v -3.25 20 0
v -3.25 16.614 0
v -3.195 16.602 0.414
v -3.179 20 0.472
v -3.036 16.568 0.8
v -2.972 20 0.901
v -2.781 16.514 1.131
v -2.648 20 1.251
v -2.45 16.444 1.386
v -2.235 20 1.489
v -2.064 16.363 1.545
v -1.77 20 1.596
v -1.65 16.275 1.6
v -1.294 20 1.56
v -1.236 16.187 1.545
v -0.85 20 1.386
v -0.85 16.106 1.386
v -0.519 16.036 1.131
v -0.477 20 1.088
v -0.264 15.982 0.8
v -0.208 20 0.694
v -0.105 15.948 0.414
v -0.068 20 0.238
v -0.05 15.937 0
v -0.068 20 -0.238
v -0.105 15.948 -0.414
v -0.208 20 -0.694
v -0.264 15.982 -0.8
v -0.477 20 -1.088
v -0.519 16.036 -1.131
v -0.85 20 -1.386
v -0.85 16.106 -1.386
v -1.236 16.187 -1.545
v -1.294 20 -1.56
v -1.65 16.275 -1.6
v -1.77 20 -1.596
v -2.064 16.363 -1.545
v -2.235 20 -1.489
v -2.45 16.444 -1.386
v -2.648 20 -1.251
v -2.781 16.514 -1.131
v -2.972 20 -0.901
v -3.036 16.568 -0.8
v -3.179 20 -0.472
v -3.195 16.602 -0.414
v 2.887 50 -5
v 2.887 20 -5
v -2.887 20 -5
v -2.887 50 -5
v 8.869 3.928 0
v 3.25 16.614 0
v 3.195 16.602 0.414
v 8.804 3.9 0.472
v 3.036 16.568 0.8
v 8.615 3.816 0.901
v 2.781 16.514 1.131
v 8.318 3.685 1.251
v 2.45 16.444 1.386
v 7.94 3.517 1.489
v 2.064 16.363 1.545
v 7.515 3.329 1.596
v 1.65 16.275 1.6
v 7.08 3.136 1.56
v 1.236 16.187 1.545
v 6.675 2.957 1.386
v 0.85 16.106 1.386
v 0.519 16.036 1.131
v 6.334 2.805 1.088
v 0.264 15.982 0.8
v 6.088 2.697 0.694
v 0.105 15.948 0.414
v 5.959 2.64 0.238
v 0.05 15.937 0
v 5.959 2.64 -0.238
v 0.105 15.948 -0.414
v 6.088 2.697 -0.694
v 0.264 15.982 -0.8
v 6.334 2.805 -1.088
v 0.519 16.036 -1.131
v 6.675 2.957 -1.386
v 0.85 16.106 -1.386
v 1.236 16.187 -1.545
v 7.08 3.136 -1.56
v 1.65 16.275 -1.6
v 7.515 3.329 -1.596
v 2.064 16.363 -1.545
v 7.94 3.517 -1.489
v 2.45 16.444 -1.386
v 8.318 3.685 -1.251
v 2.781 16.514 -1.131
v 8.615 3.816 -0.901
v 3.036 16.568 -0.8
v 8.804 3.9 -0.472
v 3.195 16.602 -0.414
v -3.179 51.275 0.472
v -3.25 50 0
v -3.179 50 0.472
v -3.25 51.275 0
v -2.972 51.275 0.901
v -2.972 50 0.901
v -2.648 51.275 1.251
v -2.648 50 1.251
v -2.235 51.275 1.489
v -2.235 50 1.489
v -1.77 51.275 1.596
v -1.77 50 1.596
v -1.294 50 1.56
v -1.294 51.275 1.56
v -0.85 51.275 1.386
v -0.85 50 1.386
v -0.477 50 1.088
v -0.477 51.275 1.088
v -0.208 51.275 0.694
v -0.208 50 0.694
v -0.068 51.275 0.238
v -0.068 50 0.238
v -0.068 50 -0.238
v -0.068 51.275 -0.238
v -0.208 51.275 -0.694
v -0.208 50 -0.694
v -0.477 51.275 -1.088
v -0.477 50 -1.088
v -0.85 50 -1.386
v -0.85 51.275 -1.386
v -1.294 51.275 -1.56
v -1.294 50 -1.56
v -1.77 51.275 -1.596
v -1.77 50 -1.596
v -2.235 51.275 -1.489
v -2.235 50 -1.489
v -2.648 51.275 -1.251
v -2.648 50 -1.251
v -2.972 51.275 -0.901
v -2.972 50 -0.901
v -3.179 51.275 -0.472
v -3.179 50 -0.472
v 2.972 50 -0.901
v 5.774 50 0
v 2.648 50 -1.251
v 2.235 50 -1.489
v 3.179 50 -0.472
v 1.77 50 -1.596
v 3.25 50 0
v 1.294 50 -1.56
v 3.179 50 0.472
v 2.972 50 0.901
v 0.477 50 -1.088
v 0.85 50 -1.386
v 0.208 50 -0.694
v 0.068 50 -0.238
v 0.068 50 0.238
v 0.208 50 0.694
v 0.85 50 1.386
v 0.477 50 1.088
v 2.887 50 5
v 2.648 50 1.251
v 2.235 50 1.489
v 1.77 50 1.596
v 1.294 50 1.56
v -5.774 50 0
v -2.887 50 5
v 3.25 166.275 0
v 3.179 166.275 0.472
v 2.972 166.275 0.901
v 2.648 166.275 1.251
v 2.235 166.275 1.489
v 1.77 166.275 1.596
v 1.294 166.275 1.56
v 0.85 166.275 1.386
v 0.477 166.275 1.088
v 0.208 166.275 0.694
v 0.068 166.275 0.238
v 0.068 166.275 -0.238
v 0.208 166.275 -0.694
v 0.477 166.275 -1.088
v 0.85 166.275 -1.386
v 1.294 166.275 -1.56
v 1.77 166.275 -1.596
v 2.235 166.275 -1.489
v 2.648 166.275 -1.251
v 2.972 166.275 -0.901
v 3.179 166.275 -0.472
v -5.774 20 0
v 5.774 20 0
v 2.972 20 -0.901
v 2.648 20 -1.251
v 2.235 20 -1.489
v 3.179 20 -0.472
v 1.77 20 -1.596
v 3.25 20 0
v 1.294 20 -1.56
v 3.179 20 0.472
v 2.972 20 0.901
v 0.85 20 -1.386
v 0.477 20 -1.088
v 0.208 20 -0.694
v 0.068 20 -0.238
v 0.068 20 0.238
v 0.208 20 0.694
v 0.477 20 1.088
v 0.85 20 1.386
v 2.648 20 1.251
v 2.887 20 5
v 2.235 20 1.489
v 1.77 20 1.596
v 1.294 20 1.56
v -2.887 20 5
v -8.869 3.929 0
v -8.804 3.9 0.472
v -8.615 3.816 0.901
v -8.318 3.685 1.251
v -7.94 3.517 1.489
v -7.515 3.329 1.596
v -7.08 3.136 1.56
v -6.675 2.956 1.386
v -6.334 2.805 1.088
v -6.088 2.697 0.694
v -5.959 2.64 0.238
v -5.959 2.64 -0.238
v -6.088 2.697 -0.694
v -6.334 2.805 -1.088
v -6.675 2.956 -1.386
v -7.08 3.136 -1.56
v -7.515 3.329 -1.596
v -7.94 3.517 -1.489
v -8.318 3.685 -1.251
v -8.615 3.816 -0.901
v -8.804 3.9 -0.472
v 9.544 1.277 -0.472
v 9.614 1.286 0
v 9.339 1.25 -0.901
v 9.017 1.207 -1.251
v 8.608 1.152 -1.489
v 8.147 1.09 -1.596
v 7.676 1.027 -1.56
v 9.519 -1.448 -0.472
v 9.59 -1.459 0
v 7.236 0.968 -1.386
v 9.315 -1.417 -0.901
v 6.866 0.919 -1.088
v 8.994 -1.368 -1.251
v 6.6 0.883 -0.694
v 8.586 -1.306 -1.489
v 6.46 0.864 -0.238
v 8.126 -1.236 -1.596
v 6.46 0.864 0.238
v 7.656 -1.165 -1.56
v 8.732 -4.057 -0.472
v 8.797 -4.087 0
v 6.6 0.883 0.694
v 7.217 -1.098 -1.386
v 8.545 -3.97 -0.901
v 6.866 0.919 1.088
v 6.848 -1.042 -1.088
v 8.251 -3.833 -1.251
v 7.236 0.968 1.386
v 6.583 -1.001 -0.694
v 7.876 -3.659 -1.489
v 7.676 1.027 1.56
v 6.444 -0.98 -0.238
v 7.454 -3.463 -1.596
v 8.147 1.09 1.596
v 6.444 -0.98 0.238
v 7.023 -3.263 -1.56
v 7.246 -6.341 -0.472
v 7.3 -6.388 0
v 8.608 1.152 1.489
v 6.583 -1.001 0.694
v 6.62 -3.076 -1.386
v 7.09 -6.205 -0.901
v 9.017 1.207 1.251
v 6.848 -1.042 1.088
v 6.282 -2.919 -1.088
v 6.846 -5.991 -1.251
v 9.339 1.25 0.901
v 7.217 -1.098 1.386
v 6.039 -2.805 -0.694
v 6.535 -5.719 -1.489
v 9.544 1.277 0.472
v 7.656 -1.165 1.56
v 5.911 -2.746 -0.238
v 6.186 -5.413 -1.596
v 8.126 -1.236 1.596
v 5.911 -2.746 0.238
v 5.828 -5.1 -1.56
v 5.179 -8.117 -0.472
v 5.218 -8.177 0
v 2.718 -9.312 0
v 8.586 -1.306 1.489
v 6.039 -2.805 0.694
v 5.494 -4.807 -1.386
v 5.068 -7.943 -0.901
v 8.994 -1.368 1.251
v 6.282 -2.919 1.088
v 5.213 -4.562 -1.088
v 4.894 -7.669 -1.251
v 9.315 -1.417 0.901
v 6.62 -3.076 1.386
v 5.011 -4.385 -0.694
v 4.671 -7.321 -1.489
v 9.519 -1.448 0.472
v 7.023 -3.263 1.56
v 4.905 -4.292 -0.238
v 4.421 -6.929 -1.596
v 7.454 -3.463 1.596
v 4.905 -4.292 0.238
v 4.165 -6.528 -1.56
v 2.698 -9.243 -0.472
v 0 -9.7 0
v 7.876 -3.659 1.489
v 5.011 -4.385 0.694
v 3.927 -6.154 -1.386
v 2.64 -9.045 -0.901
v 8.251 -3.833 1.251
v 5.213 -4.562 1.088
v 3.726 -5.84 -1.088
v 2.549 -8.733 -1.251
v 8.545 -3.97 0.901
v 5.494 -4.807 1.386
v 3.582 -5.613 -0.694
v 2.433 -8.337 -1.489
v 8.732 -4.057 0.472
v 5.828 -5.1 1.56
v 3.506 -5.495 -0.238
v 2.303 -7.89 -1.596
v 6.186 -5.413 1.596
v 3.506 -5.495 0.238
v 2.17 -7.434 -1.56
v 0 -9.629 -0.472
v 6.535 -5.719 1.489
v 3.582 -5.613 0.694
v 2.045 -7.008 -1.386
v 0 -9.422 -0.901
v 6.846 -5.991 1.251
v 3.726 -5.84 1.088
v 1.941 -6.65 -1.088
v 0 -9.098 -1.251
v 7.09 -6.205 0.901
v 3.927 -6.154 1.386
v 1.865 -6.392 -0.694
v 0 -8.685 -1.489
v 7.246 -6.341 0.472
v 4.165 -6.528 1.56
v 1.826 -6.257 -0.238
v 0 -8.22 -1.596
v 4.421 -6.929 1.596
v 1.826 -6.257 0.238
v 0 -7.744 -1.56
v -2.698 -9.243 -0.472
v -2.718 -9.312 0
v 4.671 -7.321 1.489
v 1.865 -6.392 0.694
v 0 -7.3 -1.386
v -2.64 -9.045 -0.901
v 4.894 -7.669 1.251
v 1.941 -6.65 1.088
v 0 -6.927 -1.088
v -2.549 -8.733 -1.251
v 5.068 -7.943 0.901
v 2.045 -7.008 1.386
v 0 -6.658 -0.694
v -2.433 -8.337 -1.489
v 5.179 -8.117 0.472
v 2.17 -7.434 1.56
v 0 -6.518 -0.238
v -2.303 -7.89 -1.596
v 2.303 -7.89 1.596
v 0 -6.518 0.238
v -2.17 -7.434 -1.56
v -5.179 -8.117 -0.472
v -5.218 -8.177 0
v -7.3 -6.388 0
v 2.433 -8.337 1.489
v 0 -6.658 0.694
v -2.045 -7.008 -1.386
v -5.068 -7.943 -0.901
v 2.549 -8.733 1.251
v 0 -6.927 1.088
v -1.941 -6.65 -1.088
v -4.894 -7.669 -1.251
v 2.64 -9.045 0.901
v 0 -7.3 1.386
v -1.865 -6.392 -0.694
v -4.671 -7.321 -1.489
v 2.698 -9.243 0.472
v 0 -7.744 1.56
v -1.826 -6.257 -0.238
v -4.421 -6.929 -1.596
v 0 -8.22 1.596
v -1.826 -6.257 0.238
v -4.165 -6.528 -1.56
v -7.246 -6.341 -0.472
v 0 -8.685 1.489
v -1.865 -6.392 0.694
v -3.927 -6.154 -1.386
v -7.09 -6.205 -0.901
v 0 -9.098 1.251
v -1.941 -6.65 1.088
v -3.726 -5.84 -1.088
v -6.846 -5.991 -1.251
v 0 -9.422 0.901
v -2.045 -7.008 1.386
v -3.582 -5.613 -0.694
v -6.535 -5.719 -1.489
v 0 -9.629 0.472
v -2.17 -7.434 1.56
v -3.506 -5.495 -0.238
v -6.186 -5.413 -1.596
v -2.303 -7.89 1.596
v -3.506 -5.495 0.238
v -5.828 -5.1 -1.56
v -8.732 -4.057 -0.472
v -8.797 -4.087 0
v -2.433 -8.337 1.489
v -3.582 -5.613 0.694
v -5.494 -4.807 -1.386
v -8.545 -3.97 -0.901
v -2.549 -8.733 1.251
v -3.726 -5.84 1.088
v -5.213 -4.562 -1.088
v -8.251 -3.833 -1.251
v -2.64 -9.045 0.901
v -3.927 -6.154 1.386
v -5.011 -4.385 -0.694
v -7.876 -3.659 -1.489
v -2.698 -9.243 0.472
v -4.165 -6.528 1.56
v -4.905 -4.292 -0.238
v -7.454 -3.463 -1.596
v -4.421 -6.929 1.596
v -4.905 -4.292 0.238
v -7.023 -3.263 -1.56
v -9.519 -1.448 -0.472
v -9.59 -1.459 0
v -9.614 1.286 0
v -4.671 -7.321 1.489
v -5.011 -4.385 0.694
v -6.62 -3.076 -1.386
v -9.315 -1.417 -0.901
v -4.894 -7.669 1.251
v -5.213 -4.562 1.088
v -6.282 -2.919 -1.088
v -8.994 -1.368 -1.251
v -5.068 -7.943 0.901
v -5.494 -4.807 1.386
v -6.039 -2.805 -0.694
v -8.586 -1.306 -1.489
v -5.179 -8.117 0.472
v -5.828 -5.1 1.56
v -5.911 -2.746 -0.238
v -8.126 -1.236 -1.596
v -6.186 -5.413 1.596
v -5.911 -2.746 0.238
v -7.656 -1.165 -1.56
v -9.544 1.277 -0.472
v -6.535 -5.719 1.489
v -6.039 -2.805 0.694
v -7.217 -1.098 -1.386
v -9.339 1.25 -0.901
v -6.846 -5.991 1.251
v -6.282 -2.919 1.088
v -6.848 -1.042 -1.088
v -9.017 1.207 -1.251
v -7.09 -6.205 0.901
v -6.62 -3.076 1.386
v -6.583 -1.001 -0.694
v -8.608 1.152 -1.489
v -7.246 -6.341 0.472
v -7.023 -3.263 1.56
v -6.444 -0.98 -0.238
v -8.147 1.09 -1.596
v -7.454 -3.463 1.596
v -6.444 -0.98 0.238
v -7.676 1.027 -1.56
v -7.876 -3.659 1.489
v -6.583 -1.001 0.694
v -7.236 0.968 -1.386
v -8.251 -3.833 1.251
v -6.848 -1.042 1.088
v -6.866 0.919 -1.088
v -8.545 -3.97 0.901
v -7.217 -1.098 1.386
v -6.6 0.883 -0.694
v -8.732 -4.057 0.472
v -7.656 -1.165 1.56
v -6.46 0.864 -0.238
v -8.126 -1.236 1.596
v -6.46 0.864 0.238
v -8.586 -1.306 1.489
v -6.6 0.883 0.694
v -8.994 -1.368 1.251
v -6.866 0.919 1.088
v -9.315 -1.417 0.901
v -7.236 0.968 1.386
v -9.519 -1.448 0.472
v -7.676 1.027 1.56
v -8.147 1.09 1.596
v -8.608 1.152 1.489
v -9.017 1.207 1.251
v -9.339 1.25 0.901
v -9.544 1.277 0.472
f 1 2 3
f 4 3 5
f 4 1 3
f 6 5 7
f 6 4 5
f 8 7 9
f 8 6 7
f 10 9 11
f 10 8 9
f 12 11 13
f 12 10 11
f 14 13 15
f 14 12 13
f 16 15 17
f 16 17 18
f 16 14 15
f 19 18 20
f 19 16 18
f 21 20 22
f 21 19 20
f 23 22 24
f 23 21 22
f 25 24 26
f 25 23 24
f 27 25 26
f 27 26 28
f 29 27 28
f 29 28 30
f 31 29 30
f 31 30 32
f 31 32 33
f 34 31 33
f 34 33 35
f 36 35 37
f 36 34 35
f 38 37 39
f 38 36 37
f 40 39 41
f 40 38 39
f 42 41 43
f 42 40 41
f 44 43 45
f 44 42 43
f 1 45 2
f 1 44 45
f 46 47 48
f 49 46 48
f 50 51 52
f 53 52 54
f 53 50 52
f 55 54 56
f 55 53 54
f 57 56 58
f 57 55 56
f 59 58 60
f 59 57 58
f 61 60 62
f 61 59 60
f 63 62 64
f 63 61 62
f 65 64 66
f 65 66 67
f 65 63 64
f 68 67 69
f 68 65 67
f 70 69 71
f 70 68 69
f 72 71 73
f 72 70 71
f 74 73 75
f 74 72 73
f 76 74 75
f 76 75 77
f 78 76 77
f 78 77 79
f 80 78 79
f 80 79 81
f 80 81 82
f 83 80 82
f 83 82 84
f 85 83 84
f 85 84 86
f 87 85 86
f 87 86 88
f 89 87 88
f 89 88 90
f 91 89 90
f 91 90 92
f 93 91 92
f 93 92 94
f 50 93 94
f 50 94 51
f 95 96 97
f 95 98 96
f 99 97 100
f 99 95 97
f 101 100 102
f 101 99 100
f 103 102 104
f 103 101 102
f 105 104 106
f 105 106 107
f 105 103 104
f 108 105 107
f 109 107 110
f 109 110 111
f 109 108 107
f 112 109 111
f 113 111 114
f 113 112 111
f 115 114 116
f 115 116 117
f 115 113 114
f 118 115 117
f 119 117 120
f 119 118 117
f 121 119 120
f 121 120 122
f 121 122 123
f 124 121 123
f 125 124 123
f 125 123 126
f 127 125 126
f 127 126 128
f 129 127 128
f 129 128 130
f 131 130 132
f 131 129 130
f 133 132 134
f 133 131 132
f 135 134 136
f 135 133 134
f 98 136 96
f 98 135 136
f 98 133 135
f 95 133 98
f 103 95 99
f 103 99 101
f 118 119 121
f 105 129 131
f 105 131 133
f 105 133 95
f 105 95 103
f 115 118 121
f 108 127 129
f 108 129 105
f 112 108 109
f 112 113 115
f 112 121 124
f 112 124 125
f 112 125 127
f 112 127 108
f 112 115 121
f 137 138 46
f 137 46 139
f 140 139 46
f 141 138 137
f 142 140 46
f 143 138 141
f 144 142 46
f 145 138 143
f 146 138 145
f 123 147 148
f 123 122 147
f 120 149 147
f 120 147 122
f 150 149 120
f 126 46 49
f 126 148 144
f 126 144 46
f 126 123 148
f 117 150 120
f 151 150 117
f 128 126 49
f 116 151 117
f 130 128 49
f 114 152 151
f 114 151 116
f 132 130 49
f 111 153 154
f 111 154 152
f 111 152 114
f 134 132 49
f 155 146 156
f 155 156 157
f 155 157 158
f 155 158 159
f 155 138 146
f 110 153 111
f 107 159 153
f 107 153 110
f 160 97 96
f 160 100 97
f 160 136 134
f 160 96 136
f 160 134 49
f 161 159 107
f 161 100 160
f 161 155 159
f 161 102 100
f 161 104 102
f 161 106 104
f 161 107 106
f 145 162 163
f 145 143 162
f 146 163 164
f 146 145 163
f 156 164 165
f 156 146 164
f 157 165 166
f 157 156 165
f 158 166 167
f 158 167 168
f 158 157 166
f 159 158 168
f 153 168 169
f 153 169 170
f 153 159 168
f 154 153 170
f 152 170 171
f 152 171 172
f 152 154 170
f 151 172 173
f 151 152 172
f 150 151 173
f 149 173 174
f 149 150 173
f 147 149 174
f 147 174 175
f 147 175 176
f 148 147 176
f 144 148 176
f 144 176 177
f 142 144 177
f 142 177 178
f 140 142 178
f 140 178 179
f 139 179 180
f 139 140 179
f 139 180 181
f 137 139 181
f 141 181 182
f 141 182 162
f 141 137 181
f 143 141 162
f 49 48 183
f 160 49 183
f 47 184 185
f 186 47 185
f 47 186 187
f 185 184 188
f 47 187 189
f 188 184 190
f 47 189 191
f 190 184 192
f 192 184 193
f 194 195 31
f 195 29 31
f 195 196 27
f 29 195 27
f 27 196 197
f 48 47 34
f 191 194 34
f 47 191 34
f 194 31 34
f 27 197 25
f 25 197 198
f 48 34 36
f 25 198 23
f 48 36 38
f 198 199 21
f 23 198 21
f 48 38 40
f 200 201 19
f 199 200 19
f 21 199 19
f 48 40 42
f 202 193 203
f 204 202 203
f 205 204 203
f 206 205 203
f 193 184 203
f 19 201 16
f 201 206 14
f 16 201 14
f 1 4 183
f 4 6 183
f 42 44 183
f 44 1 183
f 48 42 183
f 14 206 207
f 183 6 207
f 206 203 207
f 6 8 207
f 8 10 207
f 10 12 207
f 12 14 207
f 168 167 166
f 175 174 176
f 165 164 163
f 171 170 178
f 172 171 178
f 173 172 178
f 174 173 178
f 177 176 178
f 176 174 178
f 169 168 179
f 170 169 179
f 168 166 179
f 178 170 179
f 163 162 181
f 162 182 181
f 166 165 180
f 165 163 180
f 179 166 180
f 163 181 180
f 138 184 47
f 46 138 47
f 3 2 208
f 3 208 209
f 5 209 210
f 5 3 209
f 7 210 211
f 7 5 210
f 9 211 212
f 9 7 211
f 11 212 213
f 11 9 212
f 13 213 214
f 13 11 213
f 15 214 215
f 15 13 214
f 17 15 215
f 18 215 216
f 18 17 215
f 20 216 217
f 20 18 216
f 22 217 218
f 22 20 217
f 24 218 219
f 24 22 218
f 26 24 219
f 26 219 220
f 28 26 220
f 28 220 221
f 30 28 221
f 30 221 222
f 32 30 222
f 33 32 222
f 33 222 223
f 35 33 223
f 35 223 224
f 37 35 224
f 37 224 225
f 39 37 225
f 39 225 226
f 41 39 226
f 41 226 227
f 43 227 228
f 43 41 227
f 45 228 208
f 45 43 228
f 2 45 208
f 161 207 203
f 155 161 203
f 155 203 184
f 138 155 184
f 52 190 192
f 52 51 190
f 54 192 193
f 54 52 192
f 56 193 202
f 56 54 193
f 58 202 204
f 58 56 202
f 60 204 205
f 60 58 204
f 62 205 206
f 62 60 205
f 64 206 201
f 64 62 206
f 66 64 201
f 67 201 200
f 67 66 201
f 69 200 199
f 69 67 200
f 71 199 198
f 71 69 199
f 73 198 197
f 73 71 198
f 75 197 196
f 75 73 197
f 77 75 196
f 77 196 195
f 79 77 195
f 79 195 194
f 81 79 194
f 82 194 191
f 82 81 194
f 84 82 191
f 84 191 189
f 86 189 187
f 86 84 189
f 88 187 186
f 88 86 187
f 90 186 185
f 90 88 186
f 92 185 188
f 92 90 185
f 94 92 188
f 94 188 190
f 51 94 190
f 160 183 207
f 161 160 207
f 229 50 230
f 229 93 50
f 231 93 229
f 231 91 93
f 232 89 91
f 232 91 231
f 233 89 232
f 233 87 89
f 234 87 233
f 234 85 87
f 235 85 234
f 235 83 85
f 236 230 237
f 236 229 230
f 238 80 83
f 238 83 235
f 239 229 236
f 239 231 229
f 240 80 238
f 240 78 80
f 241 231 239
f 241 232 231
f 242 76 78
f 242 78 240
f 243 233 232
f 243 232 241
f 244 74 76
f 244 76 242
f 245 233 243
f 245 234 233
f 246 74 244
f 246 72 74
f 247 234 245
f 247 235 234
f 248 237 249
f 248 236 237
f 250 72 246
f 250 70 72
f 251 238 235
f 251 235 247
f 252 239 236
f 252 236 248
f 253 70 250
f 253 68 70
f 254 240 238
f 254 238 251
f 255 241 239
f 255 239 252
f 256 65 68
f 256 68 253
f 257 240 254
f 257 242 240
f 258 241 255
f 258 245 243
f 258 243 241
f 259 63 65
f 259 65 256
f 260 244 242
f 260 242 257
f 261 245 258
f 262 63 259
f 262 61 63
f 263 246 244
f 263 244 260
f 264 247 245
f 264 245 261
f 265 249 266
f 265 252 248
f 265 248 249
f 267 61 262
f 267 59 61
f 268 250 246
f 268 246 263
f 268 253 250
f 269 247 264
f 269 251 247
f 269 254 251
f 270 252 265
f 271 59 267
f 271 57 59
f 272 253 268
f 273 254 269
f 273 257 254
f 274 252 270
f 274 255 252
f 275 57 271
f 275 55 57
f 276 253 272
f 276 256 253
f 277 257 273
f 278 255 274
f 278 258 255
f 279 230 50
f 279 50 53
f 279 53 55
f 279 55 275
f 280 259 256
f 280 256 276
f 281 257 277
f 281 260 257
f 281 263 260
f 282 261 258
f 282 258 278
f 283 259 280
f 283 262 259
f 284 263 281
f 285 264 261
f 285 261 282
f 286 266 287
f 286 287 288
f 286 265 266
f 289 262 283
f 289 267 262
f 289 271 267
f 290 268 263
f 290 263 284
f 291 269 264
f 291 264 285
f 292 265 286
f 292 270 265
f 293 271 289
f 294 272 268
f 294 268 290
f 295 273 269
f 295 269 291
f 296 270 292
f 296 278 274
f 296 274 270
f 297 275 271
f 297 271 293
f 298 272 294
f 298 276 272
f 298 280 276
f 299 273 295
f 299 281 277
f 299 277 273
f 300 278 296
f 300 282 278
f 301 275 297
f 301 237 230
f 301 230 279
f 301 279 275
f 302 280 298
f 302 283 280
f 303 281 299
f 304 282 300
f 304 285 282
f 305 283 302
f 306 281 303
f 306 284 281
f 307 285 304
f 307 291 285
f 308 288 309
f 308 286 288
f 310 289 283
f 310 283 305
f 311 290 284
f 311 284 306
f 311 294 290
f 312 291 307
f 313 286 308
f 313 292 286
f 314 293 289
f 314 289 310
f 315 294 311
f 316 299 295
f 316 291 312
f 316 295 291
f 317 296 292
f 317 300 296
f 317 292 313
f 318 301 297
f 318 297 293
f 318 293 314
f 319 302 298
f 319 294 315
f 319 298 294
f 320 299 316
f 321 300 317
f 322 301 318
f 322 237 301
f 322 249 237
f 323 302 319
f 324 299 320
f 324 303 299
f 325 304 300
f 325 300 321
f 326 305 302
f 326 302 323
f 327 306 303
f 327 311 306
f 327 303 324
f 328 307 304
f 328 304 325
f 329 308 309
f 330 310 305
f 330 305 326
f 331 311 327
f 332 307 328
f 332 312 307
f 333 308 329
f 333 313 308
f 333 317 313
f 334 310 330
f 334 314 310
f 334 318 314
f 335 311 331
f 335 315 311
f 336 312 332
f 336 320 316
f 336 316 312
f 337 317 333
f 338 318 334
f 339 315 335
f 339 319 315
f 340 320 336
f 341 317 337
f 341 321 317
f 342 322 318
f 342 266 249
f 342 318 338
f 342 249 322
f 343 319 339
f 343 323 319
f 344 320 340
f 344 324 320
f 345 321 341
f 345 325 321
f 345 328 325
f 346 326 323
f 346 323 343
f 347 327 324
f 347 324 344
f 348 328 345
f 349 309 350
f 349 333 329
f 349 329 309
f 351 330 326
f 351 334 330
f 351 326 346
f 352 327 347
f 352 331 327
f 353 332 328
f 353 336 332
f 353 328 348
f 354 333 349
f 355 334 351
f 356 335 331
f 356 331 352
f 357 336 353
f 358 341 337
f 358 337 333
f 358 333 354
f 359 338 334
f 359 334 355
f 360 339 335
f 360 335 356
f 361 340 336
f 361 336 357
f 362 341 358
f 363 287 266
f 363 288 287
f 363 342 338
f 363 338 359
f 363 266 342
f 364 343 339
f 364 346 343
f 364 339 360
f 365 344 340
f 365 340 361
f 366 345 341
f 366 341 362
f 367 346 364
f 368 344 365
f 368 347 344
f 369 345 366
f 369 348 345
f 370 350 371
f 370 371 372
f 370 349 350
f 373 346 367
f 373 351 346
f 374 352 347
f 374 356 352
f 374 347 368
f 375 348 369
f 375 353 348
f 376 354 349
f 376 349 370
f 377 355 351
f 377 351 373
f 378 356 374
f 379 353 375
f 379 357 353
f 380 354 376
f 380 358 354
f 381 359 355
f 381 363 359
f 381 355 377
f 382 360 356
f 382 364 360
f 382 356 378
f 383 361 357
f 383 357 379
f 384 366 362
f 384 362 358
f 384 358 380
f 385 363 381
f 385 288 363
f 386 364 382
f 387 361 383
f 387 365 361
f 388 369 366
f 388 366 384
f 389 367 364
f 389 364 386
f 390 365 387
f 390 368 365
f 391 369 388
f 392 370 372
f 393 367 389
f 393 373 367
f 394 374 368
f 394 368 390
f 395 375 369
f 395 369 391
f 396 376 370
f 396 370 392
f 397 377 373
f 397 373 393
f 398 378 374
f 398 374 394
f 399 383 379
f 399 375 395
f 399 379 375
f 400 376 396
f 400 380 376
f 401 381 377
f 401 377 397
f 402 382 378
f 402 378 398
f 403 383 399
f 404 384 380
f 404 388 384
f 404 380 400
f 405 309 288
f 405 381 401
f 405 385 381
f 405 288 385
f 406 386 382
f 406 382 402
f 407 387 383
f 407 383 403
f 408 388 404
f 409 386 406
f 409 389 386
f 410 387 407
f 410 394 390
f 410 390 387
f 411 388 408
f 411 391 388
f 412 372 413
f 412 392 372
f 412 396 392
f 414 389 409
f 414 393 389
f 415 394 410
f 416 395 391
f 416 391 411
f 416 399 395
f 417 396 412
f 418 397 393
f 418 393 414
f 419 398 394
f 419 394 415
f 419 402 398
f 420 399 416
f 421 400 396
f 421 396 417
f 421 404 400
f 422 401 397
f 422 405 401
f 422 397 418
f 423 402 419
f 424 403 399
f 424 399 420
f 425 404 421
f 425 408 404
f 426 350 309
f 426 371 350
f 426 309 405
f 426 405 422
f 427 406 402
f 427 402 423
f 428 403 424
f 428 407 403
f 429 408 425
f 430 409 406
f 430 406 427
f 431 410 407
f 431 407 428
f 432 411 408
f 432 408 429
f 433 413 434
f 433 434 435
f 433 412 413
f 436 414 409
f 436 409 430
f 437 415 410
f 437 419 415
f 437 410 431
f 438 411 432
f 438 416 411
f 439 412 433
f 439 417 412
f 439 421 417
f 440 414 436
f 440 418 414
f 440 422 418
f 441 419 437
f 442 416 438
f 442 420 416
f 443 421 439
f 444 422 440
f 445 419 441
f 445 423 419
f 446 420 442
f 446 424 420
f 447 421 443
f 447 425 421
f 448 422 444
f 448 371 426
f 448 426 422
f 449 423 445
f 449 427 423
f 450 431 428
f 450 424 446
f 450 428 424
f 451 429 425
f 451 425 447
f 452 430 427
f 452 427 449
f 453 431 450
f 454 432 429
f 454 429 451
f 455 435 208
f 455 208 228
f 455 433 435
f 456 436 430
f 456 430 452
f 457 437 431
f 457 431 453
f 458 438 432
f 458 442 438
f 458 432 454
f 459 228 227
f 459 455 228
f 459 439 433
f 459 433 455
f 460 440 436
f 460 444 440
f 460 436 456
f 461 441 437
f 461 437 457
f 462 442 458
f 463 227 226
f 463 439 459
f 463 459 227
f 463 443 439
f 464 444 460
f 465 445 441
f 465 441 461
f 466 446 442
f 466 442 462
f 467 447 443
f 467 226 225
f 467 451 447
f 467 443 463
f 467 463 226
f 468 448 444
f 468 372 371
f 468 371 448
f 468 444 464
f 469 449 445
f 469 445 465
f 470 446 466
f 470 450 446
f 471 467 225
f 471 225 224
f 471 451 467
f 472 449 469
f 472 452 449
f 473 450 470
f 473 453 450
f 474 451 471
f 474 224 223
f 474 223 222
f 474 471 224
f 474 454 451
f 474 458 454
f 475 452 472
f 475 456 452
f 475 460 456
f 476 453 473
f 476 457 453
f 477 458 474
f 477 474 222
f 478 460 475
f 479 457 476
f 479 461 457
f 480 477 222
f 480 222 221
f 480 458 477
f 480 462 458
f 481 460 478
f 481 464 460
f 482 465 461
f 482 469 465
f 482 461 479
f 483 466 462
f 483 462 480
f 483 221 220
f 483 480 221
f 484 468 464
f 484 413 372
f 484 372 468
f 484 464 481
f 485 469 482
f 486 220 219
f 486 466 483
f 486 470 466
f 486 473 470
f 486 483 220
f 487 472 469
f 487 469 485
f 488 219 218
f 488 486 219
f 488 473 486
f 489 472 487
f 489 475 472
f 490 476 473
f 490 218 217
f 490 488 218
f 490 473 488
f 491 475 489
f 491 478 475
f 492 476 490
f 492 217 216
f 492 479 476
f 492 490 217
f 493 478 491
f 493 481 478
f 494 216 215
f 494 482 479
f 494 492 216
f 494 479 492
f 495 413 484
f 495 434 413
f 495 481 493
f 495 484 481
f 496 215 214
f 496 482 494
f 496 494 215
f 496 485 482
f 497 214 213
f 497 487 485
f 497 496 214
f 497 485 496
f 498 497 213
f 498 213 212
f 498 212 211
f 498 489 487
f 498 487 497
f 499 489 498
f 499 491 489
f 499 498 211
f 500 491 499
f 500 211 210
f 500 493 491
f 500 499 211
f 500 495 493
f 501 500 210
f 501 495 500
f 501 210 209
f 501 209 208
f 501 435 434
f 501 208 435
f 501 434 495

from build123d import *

# Parameters (mm, degrees)
ESBO_O2_R       = 1.6
EXTRUS_O1_DEPTH = 30


with BuildPart() as part:
    # Varredura1: sweep along a path in Esboço1
    with BuildLine(Plane.XY) as varredura1_path:
        Line((1.65, 166.275006099), (1.65, 16.275006099))
        Line((1.65, 16.275006099), (7.405965146, 3.2805))
        ThreePointArc((7.405965146, 3.2805), (0, -8.1), (-7.405965146, 3.2805))
        Line((-7.405965146, 3.2805), (-1.65, 16.275006099))
        Line((-1.65, 16.275006099), (-1.65, 51.275006099))
    # Esboço2 → Varredura1 (sweep)
    with BuildSketch(Plane(origin=(1.65, 166.275006099, 0), x_dir=(1, 0, 0), z_dir=(0, -1, 0))):
        Circle(ESBO_O2_R)
    sweep(path=varredura1_path.line, transition=Transition.RIGHT)

    # Esboço4 → Extrusão1 (add)
    with BuildSketch(Plane(origin=(0, 20, 0), x_dir=(-1, 0, 0), z_dir=(0, 1, 0))):
        Polygon((-5.773502692, 0), (-2.886751346, -5), (2.886751346, -5), (5.773502692, 0), (2.886751346, 5), (-2.886751346, 5), align=None)
    extrude(amount=EXTRUS_O1_DEPTH)


solid = part.part
